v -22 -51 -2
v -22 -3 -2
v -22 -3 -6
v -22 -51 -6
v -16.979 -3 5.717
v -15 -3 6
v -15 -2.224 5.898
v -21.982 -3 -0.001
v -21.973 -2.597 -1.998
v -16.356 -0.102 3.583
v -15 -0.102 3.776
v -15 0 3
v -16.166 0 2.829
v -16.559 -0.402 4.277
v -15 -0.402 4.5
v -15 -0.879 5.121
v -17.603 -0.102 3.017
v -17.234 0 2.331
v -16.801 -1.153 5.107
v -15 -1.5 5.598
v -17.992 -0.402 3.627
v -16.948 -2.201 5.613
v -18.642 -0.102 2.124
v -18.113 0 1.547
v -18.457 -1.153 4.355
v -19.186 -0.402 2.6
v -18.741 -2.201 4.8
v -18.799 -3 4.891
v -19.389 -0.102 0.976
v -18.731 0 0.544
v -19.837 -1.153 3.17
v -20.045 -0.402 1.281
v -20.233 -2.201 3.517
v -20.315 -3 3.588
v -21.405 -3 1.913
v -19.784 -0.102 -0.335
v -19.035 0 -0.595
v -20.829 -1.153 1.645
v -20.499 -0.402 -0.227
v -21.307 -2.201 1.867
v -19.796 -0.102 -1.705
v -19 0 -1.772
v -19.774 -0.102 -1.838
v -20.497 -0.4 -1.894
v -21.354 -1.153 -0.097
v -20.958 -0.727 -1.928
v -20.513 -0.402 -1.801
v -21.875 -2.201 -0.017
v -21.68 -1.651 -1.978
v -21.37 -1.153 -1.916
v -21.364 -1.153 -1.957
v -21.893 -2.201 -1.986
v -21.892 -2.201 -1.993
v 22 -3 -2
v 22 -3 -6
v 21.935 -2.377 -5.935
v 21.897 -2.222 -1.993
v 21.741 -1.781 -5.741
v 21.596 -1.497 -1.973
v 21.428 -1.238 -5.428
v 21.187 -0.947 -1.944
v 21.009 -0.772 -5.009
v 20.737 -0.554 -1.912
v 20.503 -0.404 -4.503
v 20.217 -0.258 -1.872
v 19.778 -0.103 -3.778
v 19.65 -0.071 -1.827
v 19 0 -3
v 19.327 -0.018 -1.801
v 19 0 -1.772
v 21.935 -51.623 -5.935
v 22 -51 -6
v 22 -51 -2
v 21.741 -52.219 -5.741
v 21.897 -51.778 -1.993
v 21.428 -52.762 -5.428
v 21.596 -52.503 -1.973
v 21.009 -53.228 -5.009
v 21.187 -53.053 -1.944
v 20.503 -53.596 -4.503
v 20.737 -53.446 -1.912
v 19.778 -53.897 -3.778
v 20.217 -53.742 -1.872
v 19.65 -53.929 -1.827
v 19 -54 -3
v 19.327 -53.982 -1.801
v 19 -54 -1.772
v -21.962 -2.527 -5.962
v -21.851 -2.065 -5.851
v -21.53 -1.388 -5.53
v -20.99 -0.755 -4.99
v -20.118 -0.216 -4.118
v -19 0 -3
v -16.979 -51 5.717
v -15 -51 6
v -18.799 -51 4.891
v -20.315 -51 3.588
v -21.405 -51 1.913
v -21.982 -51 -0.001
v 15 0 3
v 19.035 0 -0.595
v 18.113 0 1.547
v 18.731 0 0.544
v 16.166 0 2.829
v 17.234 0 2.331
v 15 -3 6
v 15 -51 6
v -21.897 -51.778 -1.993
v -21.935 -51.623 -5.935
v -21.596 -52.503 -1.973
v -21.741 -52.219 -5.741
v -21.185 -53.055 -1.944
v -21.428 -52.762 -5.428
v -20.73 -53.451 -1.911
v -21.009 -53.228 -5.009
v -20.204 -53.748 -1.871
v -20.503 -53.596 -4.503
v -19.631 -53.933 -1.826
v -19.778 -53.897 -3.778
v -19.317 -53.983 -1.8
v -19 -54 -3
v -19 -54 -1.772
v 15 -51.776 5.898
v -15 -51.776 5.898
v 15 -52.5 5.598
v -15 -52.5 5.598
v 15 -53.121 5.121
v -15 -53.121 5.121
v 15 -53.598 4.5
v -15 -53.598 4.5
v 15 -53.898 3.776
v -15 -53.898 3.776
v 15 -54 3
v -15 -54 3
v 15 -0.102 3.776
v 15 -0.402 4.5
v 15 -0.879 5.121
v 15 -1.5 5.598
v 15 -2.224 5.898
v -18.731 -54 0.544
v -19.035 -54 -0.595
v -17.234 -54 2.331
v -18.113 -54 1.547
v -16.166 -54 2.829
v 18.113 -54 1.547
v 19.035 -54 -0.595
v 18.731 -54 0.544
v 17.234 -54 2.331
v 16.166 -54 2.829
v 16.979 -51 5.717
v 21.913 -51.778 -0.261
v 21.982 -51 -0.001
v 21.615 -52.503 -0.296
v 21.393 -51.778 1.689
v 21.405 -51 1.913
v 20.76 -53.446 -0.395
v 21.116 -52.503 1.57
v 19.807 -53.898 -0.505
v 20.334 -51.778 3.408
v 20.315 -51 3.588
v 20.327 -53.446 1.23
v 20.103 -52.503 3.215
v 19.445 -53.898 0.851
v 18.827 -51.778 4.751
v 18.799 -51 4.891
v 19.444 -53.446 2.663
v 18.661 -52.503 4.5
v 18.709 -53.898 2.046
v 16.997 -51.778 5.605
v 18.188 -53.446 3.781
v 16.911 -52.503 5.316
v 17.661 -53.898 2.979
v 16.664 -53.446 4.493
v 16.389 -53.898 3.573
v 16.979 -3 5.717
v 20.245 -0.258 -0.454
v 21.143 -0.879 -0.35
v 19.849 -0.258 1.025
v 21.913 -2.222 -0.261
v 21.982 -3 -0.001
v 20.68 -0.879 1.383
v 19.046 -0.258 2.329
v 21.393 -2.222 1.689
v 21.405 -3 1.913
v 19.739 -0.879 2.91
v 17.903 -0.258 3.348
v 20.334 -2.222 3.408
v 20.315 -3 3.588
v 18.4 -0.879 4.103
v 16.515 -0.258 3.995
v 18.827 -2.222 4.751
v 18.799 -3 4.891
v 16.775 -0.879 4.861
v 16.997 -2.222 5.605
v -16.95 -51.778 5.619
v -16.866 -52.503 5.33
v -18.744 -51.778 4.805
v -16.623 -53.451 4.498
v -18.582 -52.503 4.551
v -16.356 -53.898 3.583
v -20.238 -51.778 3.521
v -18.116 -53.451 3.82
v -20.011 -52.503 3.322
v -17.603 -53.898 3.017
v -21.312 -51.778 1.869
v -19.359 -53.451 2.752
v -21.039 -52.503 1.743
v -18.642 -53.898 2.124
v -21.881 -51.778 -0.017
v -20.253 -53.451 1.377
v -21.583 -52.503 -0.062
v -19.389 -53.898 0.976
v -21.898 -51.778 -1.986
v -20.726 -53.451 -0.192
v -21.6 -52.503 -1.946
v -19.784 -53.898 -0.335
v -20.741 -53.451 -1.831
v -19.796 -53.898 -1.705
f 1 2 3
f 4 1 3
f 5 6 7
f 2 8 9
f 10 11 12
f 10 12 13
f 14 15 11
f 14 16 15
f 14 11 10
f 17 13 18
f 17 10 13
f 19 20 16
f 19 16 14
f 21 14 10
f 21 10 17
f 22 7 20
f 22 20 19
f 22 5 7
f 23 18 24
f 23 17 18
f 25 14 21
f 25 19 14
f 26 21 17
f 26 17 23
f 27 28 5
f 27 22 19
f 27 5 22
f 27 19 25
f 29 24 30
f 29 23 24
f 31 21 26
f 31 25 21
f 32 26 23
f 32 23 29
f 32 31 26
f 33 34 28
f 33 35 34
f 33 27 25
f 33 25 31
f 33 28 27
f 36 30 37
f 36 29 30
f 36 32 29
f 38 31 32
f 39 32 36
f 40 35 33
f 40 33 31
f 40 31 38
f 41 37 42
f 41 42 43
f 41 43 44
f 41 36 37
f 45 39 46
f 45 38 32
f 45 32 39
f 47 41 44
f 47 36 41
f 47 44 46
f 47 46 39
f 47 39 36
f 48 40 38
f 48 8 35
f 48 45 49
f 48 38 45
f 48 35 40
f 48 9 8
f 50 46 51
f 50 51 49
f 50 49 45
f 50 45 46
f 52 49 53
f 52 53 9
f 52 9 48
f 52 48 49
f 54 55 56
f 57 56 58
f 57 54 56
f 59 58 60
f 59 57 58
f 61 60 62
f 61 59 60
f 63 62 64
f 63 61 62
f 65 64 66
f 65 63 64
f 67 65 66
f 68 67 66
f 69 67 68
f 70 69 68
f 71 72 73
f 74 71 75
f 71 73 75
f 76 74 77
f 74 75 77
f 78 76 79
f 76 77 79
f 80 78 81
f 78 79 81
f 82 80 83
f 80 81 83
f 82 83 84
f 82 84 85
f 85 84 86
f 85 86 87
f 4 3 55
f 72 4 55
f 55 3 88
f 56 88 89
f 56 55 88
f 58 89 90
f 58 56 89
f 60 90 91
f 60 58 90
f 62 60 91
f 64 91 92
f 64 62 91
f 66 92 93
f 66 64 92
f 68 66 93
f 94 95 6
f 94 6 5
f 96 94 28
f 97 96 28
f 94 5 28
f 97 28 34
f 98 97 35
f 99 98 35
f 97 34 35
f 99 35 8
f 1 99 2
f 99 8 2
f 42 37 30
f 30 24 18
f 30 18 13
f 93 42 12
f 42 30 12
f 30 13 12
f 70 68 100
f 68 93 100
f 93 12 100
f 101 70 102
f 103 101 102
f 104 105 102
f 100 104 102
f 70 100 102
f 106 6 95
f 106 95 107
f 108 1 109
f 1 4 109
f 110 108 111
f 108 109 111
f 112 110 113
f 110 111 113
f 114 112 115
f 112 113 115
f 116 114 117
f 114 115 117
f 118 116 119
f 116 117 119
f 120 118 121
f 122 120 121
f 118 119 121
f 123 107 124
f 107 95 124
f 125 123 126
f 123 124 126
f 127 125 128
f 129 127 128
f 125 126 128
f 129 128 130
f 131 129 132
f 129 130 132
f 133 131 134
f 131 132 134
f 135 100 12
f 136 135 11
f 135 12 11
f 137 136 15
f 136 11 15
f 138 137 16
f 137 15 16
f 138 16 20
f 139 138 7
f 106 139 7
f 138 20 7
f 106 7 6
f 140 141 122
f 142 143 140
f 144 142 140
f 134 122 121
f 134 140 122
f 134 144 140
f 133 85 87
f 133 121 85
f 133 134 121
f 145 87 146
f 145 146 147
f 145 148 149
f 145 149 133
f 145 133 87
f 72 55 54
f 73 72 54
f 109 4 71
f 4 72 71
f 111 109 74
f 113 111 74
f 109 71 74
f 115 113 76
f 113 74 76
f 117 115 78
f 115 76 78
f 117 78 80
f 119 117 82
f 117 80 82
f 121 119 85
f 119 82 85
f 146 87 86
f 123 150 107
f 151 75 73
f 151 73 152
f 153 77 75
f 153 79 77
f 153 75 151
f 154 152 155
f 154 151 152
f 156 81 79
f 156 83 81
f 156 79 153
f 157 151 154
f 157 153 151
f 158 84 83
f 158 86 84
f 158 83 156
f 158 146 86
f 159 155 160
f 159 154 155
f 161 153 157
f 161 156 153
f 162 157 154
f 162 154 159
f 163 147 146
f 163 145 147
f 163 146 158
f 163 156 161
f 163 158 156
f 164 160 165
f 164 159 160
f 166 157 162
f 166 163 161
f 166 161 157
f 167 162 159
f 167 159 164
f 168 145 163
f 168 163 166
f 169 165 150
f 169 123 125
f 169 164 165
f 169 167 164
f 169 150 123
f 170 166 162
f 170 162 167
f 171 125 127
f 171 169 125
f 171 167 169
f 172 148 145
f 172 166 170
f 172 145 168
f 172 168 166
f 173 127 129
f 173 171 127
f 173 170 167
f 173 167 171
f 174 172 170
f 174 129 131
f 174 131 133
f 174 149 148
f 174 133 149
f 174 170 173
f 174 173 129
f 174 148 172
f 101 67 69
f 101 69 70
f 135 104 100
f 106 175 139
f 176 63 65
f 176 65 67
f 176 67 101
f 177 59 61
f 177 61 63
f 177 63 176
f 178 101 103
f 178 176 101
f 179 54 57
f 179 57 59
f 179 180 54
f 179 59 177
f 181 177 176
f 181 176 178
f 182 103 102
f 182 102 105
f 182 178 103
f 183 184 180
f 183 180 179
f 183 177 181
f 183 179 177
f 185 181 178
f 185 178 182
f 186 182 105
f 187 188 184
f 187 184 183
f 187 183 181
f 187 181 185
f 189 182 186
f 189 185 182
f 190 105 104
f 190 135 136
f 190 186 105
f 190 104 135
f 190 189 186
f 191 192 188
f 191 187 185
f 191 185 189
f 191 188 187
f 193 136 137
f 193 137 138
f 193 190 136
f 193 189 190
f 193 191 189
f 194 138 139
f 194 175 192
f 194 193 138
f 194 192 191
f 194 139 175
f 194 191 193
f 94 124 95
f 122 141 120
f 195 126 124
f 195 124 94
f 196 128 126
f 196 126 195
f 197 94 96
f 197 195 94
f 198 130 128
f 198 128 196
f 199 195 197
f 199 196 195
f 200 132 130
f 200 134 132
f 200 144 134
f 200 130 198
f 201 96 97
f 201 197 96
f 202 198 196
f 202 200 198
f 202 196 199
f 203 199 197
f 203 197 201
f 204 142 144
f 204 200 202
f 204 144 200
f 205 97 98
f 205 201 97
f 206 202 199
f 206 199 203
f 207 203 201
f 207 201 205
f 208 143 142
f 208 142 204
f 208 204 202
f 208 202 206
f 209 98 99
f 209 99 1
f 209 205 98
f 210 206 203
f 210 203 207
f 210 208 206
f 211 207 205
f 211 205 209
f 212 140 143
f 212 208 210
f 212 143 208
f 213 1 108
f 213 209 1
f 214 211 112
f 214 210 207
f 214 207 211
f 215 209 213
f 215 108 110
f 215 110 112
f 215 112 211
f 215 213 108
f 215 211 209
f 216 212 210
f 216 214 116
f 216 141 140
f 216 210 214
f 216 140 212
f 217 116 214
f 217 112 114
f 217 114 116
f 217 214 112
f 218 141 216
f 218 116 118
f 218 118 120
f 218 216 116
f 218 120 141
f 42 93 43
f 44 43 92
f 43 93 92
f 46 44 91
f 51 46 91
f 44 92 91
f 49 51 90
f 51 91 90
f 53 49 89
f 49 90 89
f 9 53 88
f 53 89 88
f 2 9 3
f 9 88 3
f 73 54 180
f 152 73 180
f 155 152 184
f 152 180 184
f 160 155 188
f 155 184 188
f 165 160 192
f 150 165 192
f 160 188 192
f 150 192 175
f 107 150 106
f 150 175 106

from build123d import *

# Parameters (mm, degrees)
F0_W     = 30
F0_H     = 12
F1_DEPTH = 54
F2_R     = 3
F3_R     = 3


with BuildPart() as f1:
    # F0 (on Front) → F1 (new body)
    with BuildSketch(Plane.XZ):
        Rectangle(F0_W, F0_H)
        with BuildLine():
            Line((15, 6), (15, -6))
            Line((15, -6), (22, -6))
            Line((22, -6), (22, -2))
            ThreePointArc((22, -2), (20.3150729064, 3.5881887931), (15, 6))
        make_face()
        with BuildLine():
            Line((-22, -6), (-15, -6))
            Line((-15, -6), (-15, 6))
            ThreePointArc((-15, 6), (-20.3150729064, 3.5881887931), (-22, -2))
            Line((-22, -2), (-22, -6))
        make_face()
    extrude(amount=F1_DEPTH)

    # F2
    f2_edges = [f1.edges().sort_by_distance(p)[0] for p in [
        (22, -54, -4),
        (20.315073, -54, 3.588189),
        (0, -54, 6),
        (-20.315073, -54, 3.588189),
        (-22, -54, -4),
        (0, -54, -6),
    ]]
    fillet(f2_edges, radius=F2_R)

    # F3
    f3_edges = [f1.edges().sort_by_distance(p)[0] for p in [
        (22, 0, -4),
        (20.315073, 0, 3.588189),
        (0, 0, 6),
        (-20.315073, 0, 3.588189),
        (-22, 0, -4),
        (0, 0, -6),
    ]]
    fillet(f3_edges, radius=F3_R)


solid = f1.part
